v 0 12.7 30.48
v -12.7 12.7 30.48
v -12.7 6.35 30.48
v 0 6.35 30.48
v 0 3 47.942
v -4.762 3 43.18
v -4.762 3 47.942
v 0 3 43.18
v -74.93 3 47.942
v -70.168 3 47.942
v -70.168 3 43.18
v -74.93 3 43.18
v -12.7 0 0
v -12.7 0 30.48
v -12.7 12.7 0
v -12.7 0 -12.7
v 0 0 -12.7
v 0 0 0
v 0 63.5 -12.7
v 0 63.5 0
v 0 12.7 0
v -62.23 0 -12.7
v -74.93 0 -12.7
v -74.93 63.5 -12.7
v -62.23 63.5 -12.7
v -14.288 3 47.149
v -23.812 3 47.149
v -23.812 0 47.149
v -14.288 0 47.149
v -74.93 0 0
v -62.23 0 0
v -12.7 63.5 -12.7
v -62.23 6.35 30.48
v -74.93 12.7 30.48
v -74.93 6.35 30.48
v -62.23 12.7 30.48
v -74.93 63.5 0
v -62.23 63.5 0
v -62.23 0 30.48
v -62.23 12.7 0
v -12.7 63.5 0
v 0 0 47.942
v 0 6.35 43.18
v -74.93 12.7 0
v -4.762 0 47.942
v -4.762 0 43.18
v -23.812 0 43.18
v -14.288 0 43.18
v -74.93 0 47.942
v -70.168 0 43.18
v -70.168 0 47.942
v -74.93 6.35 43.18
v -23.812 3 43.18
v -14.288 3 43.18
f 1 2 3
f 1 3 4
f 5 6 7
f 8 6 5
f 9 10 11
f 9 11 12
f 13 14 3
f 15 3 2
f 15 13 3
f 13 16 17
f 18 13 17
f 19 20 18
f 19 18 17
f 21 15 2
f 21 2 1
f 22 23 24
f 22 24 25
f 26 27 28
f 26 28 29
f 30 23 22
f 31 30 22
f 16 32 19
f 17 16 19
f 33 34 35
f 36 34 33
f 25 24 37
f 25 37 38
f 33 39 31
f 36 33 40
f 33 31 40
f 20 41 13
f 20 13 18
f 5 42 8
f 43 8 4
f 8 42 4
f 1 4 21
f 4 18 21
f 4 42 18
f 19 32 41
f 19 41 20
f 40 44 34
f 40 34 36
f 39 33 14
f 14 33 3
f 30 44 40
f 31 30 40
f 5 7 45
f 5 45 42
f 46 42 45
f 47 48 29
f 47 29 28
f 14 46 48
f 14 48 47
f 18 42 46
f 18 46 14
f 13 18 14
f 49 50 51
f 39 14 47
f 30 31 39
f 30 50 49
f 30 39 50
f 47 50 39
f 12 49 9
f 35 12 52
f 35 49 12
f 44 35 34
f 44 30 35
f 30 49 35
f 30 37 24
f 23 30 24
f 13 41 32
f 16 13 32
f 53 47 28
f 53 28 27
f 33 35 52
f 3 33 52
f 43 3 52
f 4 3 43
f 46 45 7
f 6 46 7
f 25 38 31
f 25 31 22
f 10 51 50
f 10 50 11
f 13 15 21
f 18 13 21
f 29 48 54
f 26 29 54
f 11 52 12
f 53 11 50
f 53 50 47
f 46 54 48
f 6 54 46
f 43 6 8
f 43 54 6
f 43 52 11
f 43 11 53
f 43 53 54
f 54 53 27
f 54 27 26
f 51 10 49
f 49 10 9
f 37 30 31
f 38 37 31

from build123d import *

# Parameters (mm, degrees)
SKETCH1_W             = 12.7
SKETCH1_H             = 12.7
BOSS_EXTRUDE1_DEPTH   = 63.5
BOSS_EXTRUDE1_2_DEPTH = 63.5
SKETCH5_W             = 12.7
SKETCH5_H             = 12.7
BOSS_EXTRUDE5_DEPTH   = 30.48
BOSS_EXTRUDE5_2_DEPTH = 30.48
SKETCH6_W             = 74.93
SKETCH6_H             = 6.35
BOSS_EXTRUDE6_DEPTH   = 12.7
SKETCH4_W             = 9.525
SKETCH4_H             = 3
BOSS_EXTRUDE4_DEPTH   = 3.96875
SKETCH3_W             = 4.7625
SKETCH3_H             = 3
BOSS_EXTRUDE7_DEPTH   = 4.7625


with BuildPart() as part:
    # Sketch1 → Boss-Extrude1 (new body)
    with BuildSketch(Plane(origin=(0, 0, 0), x_dir=(1, 0, 0), z_dir=(0, 1, 0))):
        with Locations((-68.58, 6.35)):
            Rectangle(SKETCH1_W, SKETCH1_H)
    extrude(amount=BOSS_EXTRUDE1_DEPTH)


with BuildPart() as body_2:
    # Sketch1 → Boss-Extrude1 2 (new body)
    with BuildSketch(Plane(origin=(0, 0, 0), x_dir=(1, 0, 0), z_dir=(0, 1, 0))):
        with Locations((-6.35, 6.35)):
            Rectangle(SKETCH1_W, SKETCH1_H)
    extrude(amount=BOSS_EXTRUDE1_2_DEPTH)


with BuildPart() as body_3:
    # Sketch5 → Boss-Extrude5 (new body)
    with BuildSketch(Plane.XY):
        with Locations((-68.58, 6.35)):
            Rectangle(SKETCH5_W, SKETCH5_H)
    extrude(amount=BOSS_EXTRUDE5_DEPTH)



with BuildPart() as body_4:
    # Sketch5 → Boss-Extrude5 2 (new body)
    with BuildSketch(Plane.XY):
        with Locations((-6.35, 6.35)):
            Rectangle(SKETCH5_W, SKETCH5_H)
    extrude(amount=BOSS_EXTRUDE5_2_DEPTH)


with BuildPart() as body_3_1:
    add(body_3.part)

    add(body_4.part)  # Boss-Extrude6 merges body 4
    # Sketch6 → Boss-Extrude6 (add)
    with BuildSketch(Plane.XY.offset(30.48)):
        with Locations((-37.465, 3.175)):
            Rectangle(SKETCH6_W, SKETCH6_H)
    extrude(amount=BOSS_EXTRUDE6_DEPTH)

    # Sketch4 → Boss-Extrude4 (add)
    with BuildSketch(Plane.XY.offset(43.18)):
        with Locations((-19.05, 1.5)):
            Rectangle(SKETCH4_W, SKETCH4_H)
    extrude(amount=BOSS_EXTRUDE4_DEPTH)

    # Sketch3 → Boss-Extrude7 (add)
    with BuildSketch(Plane.XY.offset(43.18)):
        with Locations((-2.38125, 1.5)):
            Rectangle(SKETCH3_W, SKETCH3_H)
    boss_extrude7 = extrude(amount=BOSS_EXTRUDE7_DEPTH)

    # Mirror2: Boss-Extrude7 across plane
    add(boss_extrude7.mirror(Plane(origin=(-37.465, 0, 0), x_dir=(0, 0, 1), z_dir=(1, 0, 0))))


solid = Compound([part.part, body_2.part, body_3_1.part])
